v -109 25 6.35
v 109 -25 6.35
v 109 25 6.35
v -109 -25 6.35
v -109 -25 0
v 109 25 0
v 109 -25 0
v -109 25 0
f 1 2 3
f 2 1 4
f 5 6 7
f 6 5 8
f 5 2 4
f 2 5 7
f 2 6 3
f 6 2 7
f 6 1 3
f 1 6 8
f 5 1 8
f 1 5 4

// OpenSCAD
// Complete OEM mount and rear cradle, mm; manufactured sizes, not OEM CAD.
view="oem_base"; shim_t=1.65; side=1; // mirror rear-cradle foot with side=-1
module slot(length,width,thickness){hull(){translate([-(length-width)/2,0,-1])cylinder(h=thickness+2,d=width,$fn=48);translate([(length-width)/2,0,-1])cylinder(h=thickness+2,d=width,$fn=48);}}
if(view=="oem_base")translate([-109,-25,0])cube([218,50,6.35]); // drill received key/stud positions after registration
if(view=="oem_shim")translate([-25,-40,0])cube([50,80,shim_t]);
if(view=="oem_capture")difference(){translate([-106,-25,0])cube([212,50,12.7]);translate([-10,-26,-1])cube([20,31,15]);for(x=[-90,90])translate([x,0,-1])cylinder(h=15,d=10,$fn=48);}
if(view=="oem_key_layer")difference(){translate([-18,-12.5,0])cube([36,25,6.35]);for(x=[-9,9])translate([x,0,-1])cylinder(h=9,d=10,$fn=48);}
if(view=="oem_key_spreader")difference(){translate([-18,-20,0])cube([36,40,6.35]);for(x=[-9,9])translate([x,0,-1])cylinder(h=9,d=10,$fn=48);}
if(view=="cartridge_post")translate([-75,-25,0])cube([150,50,6.35]);
if(view=="cartridge_foot")difference(){translate([-100,-25,0])cube([200,50,6.35]);for(x=[-85,85])translate([x,17*side,0])slot(20,11,6.35);}

// Clamp straps bear on the fixed OEM bracket flange; never clamp the moving lever or button linkage.

// Guard rails are400x25x6.35 edge-on;4hangers85x25x6.35 and2cross-supports220x25x6.35.
// Each100x50x6.35 bench mounting foot has2 diameter10 holes50mm apart; underside80x40x6 spreader.
if(view=="bench_foot")difference(){translate([-50,-25,0])cube([100,50,6.35]);for(x=[-25,25])translate([x,0,-1])cylinder(h=9,d=10,$fn=48);}

if(view=="oem_key_stack")for(i=[0:3])translate([0,0,6.35*i])difference(){translate([-18,-12.5,0])cube([36,25,6.35]);for(x=[-9,9])translate([x,0,-1])cylinder(h=9,d=10,$fn=48);}
